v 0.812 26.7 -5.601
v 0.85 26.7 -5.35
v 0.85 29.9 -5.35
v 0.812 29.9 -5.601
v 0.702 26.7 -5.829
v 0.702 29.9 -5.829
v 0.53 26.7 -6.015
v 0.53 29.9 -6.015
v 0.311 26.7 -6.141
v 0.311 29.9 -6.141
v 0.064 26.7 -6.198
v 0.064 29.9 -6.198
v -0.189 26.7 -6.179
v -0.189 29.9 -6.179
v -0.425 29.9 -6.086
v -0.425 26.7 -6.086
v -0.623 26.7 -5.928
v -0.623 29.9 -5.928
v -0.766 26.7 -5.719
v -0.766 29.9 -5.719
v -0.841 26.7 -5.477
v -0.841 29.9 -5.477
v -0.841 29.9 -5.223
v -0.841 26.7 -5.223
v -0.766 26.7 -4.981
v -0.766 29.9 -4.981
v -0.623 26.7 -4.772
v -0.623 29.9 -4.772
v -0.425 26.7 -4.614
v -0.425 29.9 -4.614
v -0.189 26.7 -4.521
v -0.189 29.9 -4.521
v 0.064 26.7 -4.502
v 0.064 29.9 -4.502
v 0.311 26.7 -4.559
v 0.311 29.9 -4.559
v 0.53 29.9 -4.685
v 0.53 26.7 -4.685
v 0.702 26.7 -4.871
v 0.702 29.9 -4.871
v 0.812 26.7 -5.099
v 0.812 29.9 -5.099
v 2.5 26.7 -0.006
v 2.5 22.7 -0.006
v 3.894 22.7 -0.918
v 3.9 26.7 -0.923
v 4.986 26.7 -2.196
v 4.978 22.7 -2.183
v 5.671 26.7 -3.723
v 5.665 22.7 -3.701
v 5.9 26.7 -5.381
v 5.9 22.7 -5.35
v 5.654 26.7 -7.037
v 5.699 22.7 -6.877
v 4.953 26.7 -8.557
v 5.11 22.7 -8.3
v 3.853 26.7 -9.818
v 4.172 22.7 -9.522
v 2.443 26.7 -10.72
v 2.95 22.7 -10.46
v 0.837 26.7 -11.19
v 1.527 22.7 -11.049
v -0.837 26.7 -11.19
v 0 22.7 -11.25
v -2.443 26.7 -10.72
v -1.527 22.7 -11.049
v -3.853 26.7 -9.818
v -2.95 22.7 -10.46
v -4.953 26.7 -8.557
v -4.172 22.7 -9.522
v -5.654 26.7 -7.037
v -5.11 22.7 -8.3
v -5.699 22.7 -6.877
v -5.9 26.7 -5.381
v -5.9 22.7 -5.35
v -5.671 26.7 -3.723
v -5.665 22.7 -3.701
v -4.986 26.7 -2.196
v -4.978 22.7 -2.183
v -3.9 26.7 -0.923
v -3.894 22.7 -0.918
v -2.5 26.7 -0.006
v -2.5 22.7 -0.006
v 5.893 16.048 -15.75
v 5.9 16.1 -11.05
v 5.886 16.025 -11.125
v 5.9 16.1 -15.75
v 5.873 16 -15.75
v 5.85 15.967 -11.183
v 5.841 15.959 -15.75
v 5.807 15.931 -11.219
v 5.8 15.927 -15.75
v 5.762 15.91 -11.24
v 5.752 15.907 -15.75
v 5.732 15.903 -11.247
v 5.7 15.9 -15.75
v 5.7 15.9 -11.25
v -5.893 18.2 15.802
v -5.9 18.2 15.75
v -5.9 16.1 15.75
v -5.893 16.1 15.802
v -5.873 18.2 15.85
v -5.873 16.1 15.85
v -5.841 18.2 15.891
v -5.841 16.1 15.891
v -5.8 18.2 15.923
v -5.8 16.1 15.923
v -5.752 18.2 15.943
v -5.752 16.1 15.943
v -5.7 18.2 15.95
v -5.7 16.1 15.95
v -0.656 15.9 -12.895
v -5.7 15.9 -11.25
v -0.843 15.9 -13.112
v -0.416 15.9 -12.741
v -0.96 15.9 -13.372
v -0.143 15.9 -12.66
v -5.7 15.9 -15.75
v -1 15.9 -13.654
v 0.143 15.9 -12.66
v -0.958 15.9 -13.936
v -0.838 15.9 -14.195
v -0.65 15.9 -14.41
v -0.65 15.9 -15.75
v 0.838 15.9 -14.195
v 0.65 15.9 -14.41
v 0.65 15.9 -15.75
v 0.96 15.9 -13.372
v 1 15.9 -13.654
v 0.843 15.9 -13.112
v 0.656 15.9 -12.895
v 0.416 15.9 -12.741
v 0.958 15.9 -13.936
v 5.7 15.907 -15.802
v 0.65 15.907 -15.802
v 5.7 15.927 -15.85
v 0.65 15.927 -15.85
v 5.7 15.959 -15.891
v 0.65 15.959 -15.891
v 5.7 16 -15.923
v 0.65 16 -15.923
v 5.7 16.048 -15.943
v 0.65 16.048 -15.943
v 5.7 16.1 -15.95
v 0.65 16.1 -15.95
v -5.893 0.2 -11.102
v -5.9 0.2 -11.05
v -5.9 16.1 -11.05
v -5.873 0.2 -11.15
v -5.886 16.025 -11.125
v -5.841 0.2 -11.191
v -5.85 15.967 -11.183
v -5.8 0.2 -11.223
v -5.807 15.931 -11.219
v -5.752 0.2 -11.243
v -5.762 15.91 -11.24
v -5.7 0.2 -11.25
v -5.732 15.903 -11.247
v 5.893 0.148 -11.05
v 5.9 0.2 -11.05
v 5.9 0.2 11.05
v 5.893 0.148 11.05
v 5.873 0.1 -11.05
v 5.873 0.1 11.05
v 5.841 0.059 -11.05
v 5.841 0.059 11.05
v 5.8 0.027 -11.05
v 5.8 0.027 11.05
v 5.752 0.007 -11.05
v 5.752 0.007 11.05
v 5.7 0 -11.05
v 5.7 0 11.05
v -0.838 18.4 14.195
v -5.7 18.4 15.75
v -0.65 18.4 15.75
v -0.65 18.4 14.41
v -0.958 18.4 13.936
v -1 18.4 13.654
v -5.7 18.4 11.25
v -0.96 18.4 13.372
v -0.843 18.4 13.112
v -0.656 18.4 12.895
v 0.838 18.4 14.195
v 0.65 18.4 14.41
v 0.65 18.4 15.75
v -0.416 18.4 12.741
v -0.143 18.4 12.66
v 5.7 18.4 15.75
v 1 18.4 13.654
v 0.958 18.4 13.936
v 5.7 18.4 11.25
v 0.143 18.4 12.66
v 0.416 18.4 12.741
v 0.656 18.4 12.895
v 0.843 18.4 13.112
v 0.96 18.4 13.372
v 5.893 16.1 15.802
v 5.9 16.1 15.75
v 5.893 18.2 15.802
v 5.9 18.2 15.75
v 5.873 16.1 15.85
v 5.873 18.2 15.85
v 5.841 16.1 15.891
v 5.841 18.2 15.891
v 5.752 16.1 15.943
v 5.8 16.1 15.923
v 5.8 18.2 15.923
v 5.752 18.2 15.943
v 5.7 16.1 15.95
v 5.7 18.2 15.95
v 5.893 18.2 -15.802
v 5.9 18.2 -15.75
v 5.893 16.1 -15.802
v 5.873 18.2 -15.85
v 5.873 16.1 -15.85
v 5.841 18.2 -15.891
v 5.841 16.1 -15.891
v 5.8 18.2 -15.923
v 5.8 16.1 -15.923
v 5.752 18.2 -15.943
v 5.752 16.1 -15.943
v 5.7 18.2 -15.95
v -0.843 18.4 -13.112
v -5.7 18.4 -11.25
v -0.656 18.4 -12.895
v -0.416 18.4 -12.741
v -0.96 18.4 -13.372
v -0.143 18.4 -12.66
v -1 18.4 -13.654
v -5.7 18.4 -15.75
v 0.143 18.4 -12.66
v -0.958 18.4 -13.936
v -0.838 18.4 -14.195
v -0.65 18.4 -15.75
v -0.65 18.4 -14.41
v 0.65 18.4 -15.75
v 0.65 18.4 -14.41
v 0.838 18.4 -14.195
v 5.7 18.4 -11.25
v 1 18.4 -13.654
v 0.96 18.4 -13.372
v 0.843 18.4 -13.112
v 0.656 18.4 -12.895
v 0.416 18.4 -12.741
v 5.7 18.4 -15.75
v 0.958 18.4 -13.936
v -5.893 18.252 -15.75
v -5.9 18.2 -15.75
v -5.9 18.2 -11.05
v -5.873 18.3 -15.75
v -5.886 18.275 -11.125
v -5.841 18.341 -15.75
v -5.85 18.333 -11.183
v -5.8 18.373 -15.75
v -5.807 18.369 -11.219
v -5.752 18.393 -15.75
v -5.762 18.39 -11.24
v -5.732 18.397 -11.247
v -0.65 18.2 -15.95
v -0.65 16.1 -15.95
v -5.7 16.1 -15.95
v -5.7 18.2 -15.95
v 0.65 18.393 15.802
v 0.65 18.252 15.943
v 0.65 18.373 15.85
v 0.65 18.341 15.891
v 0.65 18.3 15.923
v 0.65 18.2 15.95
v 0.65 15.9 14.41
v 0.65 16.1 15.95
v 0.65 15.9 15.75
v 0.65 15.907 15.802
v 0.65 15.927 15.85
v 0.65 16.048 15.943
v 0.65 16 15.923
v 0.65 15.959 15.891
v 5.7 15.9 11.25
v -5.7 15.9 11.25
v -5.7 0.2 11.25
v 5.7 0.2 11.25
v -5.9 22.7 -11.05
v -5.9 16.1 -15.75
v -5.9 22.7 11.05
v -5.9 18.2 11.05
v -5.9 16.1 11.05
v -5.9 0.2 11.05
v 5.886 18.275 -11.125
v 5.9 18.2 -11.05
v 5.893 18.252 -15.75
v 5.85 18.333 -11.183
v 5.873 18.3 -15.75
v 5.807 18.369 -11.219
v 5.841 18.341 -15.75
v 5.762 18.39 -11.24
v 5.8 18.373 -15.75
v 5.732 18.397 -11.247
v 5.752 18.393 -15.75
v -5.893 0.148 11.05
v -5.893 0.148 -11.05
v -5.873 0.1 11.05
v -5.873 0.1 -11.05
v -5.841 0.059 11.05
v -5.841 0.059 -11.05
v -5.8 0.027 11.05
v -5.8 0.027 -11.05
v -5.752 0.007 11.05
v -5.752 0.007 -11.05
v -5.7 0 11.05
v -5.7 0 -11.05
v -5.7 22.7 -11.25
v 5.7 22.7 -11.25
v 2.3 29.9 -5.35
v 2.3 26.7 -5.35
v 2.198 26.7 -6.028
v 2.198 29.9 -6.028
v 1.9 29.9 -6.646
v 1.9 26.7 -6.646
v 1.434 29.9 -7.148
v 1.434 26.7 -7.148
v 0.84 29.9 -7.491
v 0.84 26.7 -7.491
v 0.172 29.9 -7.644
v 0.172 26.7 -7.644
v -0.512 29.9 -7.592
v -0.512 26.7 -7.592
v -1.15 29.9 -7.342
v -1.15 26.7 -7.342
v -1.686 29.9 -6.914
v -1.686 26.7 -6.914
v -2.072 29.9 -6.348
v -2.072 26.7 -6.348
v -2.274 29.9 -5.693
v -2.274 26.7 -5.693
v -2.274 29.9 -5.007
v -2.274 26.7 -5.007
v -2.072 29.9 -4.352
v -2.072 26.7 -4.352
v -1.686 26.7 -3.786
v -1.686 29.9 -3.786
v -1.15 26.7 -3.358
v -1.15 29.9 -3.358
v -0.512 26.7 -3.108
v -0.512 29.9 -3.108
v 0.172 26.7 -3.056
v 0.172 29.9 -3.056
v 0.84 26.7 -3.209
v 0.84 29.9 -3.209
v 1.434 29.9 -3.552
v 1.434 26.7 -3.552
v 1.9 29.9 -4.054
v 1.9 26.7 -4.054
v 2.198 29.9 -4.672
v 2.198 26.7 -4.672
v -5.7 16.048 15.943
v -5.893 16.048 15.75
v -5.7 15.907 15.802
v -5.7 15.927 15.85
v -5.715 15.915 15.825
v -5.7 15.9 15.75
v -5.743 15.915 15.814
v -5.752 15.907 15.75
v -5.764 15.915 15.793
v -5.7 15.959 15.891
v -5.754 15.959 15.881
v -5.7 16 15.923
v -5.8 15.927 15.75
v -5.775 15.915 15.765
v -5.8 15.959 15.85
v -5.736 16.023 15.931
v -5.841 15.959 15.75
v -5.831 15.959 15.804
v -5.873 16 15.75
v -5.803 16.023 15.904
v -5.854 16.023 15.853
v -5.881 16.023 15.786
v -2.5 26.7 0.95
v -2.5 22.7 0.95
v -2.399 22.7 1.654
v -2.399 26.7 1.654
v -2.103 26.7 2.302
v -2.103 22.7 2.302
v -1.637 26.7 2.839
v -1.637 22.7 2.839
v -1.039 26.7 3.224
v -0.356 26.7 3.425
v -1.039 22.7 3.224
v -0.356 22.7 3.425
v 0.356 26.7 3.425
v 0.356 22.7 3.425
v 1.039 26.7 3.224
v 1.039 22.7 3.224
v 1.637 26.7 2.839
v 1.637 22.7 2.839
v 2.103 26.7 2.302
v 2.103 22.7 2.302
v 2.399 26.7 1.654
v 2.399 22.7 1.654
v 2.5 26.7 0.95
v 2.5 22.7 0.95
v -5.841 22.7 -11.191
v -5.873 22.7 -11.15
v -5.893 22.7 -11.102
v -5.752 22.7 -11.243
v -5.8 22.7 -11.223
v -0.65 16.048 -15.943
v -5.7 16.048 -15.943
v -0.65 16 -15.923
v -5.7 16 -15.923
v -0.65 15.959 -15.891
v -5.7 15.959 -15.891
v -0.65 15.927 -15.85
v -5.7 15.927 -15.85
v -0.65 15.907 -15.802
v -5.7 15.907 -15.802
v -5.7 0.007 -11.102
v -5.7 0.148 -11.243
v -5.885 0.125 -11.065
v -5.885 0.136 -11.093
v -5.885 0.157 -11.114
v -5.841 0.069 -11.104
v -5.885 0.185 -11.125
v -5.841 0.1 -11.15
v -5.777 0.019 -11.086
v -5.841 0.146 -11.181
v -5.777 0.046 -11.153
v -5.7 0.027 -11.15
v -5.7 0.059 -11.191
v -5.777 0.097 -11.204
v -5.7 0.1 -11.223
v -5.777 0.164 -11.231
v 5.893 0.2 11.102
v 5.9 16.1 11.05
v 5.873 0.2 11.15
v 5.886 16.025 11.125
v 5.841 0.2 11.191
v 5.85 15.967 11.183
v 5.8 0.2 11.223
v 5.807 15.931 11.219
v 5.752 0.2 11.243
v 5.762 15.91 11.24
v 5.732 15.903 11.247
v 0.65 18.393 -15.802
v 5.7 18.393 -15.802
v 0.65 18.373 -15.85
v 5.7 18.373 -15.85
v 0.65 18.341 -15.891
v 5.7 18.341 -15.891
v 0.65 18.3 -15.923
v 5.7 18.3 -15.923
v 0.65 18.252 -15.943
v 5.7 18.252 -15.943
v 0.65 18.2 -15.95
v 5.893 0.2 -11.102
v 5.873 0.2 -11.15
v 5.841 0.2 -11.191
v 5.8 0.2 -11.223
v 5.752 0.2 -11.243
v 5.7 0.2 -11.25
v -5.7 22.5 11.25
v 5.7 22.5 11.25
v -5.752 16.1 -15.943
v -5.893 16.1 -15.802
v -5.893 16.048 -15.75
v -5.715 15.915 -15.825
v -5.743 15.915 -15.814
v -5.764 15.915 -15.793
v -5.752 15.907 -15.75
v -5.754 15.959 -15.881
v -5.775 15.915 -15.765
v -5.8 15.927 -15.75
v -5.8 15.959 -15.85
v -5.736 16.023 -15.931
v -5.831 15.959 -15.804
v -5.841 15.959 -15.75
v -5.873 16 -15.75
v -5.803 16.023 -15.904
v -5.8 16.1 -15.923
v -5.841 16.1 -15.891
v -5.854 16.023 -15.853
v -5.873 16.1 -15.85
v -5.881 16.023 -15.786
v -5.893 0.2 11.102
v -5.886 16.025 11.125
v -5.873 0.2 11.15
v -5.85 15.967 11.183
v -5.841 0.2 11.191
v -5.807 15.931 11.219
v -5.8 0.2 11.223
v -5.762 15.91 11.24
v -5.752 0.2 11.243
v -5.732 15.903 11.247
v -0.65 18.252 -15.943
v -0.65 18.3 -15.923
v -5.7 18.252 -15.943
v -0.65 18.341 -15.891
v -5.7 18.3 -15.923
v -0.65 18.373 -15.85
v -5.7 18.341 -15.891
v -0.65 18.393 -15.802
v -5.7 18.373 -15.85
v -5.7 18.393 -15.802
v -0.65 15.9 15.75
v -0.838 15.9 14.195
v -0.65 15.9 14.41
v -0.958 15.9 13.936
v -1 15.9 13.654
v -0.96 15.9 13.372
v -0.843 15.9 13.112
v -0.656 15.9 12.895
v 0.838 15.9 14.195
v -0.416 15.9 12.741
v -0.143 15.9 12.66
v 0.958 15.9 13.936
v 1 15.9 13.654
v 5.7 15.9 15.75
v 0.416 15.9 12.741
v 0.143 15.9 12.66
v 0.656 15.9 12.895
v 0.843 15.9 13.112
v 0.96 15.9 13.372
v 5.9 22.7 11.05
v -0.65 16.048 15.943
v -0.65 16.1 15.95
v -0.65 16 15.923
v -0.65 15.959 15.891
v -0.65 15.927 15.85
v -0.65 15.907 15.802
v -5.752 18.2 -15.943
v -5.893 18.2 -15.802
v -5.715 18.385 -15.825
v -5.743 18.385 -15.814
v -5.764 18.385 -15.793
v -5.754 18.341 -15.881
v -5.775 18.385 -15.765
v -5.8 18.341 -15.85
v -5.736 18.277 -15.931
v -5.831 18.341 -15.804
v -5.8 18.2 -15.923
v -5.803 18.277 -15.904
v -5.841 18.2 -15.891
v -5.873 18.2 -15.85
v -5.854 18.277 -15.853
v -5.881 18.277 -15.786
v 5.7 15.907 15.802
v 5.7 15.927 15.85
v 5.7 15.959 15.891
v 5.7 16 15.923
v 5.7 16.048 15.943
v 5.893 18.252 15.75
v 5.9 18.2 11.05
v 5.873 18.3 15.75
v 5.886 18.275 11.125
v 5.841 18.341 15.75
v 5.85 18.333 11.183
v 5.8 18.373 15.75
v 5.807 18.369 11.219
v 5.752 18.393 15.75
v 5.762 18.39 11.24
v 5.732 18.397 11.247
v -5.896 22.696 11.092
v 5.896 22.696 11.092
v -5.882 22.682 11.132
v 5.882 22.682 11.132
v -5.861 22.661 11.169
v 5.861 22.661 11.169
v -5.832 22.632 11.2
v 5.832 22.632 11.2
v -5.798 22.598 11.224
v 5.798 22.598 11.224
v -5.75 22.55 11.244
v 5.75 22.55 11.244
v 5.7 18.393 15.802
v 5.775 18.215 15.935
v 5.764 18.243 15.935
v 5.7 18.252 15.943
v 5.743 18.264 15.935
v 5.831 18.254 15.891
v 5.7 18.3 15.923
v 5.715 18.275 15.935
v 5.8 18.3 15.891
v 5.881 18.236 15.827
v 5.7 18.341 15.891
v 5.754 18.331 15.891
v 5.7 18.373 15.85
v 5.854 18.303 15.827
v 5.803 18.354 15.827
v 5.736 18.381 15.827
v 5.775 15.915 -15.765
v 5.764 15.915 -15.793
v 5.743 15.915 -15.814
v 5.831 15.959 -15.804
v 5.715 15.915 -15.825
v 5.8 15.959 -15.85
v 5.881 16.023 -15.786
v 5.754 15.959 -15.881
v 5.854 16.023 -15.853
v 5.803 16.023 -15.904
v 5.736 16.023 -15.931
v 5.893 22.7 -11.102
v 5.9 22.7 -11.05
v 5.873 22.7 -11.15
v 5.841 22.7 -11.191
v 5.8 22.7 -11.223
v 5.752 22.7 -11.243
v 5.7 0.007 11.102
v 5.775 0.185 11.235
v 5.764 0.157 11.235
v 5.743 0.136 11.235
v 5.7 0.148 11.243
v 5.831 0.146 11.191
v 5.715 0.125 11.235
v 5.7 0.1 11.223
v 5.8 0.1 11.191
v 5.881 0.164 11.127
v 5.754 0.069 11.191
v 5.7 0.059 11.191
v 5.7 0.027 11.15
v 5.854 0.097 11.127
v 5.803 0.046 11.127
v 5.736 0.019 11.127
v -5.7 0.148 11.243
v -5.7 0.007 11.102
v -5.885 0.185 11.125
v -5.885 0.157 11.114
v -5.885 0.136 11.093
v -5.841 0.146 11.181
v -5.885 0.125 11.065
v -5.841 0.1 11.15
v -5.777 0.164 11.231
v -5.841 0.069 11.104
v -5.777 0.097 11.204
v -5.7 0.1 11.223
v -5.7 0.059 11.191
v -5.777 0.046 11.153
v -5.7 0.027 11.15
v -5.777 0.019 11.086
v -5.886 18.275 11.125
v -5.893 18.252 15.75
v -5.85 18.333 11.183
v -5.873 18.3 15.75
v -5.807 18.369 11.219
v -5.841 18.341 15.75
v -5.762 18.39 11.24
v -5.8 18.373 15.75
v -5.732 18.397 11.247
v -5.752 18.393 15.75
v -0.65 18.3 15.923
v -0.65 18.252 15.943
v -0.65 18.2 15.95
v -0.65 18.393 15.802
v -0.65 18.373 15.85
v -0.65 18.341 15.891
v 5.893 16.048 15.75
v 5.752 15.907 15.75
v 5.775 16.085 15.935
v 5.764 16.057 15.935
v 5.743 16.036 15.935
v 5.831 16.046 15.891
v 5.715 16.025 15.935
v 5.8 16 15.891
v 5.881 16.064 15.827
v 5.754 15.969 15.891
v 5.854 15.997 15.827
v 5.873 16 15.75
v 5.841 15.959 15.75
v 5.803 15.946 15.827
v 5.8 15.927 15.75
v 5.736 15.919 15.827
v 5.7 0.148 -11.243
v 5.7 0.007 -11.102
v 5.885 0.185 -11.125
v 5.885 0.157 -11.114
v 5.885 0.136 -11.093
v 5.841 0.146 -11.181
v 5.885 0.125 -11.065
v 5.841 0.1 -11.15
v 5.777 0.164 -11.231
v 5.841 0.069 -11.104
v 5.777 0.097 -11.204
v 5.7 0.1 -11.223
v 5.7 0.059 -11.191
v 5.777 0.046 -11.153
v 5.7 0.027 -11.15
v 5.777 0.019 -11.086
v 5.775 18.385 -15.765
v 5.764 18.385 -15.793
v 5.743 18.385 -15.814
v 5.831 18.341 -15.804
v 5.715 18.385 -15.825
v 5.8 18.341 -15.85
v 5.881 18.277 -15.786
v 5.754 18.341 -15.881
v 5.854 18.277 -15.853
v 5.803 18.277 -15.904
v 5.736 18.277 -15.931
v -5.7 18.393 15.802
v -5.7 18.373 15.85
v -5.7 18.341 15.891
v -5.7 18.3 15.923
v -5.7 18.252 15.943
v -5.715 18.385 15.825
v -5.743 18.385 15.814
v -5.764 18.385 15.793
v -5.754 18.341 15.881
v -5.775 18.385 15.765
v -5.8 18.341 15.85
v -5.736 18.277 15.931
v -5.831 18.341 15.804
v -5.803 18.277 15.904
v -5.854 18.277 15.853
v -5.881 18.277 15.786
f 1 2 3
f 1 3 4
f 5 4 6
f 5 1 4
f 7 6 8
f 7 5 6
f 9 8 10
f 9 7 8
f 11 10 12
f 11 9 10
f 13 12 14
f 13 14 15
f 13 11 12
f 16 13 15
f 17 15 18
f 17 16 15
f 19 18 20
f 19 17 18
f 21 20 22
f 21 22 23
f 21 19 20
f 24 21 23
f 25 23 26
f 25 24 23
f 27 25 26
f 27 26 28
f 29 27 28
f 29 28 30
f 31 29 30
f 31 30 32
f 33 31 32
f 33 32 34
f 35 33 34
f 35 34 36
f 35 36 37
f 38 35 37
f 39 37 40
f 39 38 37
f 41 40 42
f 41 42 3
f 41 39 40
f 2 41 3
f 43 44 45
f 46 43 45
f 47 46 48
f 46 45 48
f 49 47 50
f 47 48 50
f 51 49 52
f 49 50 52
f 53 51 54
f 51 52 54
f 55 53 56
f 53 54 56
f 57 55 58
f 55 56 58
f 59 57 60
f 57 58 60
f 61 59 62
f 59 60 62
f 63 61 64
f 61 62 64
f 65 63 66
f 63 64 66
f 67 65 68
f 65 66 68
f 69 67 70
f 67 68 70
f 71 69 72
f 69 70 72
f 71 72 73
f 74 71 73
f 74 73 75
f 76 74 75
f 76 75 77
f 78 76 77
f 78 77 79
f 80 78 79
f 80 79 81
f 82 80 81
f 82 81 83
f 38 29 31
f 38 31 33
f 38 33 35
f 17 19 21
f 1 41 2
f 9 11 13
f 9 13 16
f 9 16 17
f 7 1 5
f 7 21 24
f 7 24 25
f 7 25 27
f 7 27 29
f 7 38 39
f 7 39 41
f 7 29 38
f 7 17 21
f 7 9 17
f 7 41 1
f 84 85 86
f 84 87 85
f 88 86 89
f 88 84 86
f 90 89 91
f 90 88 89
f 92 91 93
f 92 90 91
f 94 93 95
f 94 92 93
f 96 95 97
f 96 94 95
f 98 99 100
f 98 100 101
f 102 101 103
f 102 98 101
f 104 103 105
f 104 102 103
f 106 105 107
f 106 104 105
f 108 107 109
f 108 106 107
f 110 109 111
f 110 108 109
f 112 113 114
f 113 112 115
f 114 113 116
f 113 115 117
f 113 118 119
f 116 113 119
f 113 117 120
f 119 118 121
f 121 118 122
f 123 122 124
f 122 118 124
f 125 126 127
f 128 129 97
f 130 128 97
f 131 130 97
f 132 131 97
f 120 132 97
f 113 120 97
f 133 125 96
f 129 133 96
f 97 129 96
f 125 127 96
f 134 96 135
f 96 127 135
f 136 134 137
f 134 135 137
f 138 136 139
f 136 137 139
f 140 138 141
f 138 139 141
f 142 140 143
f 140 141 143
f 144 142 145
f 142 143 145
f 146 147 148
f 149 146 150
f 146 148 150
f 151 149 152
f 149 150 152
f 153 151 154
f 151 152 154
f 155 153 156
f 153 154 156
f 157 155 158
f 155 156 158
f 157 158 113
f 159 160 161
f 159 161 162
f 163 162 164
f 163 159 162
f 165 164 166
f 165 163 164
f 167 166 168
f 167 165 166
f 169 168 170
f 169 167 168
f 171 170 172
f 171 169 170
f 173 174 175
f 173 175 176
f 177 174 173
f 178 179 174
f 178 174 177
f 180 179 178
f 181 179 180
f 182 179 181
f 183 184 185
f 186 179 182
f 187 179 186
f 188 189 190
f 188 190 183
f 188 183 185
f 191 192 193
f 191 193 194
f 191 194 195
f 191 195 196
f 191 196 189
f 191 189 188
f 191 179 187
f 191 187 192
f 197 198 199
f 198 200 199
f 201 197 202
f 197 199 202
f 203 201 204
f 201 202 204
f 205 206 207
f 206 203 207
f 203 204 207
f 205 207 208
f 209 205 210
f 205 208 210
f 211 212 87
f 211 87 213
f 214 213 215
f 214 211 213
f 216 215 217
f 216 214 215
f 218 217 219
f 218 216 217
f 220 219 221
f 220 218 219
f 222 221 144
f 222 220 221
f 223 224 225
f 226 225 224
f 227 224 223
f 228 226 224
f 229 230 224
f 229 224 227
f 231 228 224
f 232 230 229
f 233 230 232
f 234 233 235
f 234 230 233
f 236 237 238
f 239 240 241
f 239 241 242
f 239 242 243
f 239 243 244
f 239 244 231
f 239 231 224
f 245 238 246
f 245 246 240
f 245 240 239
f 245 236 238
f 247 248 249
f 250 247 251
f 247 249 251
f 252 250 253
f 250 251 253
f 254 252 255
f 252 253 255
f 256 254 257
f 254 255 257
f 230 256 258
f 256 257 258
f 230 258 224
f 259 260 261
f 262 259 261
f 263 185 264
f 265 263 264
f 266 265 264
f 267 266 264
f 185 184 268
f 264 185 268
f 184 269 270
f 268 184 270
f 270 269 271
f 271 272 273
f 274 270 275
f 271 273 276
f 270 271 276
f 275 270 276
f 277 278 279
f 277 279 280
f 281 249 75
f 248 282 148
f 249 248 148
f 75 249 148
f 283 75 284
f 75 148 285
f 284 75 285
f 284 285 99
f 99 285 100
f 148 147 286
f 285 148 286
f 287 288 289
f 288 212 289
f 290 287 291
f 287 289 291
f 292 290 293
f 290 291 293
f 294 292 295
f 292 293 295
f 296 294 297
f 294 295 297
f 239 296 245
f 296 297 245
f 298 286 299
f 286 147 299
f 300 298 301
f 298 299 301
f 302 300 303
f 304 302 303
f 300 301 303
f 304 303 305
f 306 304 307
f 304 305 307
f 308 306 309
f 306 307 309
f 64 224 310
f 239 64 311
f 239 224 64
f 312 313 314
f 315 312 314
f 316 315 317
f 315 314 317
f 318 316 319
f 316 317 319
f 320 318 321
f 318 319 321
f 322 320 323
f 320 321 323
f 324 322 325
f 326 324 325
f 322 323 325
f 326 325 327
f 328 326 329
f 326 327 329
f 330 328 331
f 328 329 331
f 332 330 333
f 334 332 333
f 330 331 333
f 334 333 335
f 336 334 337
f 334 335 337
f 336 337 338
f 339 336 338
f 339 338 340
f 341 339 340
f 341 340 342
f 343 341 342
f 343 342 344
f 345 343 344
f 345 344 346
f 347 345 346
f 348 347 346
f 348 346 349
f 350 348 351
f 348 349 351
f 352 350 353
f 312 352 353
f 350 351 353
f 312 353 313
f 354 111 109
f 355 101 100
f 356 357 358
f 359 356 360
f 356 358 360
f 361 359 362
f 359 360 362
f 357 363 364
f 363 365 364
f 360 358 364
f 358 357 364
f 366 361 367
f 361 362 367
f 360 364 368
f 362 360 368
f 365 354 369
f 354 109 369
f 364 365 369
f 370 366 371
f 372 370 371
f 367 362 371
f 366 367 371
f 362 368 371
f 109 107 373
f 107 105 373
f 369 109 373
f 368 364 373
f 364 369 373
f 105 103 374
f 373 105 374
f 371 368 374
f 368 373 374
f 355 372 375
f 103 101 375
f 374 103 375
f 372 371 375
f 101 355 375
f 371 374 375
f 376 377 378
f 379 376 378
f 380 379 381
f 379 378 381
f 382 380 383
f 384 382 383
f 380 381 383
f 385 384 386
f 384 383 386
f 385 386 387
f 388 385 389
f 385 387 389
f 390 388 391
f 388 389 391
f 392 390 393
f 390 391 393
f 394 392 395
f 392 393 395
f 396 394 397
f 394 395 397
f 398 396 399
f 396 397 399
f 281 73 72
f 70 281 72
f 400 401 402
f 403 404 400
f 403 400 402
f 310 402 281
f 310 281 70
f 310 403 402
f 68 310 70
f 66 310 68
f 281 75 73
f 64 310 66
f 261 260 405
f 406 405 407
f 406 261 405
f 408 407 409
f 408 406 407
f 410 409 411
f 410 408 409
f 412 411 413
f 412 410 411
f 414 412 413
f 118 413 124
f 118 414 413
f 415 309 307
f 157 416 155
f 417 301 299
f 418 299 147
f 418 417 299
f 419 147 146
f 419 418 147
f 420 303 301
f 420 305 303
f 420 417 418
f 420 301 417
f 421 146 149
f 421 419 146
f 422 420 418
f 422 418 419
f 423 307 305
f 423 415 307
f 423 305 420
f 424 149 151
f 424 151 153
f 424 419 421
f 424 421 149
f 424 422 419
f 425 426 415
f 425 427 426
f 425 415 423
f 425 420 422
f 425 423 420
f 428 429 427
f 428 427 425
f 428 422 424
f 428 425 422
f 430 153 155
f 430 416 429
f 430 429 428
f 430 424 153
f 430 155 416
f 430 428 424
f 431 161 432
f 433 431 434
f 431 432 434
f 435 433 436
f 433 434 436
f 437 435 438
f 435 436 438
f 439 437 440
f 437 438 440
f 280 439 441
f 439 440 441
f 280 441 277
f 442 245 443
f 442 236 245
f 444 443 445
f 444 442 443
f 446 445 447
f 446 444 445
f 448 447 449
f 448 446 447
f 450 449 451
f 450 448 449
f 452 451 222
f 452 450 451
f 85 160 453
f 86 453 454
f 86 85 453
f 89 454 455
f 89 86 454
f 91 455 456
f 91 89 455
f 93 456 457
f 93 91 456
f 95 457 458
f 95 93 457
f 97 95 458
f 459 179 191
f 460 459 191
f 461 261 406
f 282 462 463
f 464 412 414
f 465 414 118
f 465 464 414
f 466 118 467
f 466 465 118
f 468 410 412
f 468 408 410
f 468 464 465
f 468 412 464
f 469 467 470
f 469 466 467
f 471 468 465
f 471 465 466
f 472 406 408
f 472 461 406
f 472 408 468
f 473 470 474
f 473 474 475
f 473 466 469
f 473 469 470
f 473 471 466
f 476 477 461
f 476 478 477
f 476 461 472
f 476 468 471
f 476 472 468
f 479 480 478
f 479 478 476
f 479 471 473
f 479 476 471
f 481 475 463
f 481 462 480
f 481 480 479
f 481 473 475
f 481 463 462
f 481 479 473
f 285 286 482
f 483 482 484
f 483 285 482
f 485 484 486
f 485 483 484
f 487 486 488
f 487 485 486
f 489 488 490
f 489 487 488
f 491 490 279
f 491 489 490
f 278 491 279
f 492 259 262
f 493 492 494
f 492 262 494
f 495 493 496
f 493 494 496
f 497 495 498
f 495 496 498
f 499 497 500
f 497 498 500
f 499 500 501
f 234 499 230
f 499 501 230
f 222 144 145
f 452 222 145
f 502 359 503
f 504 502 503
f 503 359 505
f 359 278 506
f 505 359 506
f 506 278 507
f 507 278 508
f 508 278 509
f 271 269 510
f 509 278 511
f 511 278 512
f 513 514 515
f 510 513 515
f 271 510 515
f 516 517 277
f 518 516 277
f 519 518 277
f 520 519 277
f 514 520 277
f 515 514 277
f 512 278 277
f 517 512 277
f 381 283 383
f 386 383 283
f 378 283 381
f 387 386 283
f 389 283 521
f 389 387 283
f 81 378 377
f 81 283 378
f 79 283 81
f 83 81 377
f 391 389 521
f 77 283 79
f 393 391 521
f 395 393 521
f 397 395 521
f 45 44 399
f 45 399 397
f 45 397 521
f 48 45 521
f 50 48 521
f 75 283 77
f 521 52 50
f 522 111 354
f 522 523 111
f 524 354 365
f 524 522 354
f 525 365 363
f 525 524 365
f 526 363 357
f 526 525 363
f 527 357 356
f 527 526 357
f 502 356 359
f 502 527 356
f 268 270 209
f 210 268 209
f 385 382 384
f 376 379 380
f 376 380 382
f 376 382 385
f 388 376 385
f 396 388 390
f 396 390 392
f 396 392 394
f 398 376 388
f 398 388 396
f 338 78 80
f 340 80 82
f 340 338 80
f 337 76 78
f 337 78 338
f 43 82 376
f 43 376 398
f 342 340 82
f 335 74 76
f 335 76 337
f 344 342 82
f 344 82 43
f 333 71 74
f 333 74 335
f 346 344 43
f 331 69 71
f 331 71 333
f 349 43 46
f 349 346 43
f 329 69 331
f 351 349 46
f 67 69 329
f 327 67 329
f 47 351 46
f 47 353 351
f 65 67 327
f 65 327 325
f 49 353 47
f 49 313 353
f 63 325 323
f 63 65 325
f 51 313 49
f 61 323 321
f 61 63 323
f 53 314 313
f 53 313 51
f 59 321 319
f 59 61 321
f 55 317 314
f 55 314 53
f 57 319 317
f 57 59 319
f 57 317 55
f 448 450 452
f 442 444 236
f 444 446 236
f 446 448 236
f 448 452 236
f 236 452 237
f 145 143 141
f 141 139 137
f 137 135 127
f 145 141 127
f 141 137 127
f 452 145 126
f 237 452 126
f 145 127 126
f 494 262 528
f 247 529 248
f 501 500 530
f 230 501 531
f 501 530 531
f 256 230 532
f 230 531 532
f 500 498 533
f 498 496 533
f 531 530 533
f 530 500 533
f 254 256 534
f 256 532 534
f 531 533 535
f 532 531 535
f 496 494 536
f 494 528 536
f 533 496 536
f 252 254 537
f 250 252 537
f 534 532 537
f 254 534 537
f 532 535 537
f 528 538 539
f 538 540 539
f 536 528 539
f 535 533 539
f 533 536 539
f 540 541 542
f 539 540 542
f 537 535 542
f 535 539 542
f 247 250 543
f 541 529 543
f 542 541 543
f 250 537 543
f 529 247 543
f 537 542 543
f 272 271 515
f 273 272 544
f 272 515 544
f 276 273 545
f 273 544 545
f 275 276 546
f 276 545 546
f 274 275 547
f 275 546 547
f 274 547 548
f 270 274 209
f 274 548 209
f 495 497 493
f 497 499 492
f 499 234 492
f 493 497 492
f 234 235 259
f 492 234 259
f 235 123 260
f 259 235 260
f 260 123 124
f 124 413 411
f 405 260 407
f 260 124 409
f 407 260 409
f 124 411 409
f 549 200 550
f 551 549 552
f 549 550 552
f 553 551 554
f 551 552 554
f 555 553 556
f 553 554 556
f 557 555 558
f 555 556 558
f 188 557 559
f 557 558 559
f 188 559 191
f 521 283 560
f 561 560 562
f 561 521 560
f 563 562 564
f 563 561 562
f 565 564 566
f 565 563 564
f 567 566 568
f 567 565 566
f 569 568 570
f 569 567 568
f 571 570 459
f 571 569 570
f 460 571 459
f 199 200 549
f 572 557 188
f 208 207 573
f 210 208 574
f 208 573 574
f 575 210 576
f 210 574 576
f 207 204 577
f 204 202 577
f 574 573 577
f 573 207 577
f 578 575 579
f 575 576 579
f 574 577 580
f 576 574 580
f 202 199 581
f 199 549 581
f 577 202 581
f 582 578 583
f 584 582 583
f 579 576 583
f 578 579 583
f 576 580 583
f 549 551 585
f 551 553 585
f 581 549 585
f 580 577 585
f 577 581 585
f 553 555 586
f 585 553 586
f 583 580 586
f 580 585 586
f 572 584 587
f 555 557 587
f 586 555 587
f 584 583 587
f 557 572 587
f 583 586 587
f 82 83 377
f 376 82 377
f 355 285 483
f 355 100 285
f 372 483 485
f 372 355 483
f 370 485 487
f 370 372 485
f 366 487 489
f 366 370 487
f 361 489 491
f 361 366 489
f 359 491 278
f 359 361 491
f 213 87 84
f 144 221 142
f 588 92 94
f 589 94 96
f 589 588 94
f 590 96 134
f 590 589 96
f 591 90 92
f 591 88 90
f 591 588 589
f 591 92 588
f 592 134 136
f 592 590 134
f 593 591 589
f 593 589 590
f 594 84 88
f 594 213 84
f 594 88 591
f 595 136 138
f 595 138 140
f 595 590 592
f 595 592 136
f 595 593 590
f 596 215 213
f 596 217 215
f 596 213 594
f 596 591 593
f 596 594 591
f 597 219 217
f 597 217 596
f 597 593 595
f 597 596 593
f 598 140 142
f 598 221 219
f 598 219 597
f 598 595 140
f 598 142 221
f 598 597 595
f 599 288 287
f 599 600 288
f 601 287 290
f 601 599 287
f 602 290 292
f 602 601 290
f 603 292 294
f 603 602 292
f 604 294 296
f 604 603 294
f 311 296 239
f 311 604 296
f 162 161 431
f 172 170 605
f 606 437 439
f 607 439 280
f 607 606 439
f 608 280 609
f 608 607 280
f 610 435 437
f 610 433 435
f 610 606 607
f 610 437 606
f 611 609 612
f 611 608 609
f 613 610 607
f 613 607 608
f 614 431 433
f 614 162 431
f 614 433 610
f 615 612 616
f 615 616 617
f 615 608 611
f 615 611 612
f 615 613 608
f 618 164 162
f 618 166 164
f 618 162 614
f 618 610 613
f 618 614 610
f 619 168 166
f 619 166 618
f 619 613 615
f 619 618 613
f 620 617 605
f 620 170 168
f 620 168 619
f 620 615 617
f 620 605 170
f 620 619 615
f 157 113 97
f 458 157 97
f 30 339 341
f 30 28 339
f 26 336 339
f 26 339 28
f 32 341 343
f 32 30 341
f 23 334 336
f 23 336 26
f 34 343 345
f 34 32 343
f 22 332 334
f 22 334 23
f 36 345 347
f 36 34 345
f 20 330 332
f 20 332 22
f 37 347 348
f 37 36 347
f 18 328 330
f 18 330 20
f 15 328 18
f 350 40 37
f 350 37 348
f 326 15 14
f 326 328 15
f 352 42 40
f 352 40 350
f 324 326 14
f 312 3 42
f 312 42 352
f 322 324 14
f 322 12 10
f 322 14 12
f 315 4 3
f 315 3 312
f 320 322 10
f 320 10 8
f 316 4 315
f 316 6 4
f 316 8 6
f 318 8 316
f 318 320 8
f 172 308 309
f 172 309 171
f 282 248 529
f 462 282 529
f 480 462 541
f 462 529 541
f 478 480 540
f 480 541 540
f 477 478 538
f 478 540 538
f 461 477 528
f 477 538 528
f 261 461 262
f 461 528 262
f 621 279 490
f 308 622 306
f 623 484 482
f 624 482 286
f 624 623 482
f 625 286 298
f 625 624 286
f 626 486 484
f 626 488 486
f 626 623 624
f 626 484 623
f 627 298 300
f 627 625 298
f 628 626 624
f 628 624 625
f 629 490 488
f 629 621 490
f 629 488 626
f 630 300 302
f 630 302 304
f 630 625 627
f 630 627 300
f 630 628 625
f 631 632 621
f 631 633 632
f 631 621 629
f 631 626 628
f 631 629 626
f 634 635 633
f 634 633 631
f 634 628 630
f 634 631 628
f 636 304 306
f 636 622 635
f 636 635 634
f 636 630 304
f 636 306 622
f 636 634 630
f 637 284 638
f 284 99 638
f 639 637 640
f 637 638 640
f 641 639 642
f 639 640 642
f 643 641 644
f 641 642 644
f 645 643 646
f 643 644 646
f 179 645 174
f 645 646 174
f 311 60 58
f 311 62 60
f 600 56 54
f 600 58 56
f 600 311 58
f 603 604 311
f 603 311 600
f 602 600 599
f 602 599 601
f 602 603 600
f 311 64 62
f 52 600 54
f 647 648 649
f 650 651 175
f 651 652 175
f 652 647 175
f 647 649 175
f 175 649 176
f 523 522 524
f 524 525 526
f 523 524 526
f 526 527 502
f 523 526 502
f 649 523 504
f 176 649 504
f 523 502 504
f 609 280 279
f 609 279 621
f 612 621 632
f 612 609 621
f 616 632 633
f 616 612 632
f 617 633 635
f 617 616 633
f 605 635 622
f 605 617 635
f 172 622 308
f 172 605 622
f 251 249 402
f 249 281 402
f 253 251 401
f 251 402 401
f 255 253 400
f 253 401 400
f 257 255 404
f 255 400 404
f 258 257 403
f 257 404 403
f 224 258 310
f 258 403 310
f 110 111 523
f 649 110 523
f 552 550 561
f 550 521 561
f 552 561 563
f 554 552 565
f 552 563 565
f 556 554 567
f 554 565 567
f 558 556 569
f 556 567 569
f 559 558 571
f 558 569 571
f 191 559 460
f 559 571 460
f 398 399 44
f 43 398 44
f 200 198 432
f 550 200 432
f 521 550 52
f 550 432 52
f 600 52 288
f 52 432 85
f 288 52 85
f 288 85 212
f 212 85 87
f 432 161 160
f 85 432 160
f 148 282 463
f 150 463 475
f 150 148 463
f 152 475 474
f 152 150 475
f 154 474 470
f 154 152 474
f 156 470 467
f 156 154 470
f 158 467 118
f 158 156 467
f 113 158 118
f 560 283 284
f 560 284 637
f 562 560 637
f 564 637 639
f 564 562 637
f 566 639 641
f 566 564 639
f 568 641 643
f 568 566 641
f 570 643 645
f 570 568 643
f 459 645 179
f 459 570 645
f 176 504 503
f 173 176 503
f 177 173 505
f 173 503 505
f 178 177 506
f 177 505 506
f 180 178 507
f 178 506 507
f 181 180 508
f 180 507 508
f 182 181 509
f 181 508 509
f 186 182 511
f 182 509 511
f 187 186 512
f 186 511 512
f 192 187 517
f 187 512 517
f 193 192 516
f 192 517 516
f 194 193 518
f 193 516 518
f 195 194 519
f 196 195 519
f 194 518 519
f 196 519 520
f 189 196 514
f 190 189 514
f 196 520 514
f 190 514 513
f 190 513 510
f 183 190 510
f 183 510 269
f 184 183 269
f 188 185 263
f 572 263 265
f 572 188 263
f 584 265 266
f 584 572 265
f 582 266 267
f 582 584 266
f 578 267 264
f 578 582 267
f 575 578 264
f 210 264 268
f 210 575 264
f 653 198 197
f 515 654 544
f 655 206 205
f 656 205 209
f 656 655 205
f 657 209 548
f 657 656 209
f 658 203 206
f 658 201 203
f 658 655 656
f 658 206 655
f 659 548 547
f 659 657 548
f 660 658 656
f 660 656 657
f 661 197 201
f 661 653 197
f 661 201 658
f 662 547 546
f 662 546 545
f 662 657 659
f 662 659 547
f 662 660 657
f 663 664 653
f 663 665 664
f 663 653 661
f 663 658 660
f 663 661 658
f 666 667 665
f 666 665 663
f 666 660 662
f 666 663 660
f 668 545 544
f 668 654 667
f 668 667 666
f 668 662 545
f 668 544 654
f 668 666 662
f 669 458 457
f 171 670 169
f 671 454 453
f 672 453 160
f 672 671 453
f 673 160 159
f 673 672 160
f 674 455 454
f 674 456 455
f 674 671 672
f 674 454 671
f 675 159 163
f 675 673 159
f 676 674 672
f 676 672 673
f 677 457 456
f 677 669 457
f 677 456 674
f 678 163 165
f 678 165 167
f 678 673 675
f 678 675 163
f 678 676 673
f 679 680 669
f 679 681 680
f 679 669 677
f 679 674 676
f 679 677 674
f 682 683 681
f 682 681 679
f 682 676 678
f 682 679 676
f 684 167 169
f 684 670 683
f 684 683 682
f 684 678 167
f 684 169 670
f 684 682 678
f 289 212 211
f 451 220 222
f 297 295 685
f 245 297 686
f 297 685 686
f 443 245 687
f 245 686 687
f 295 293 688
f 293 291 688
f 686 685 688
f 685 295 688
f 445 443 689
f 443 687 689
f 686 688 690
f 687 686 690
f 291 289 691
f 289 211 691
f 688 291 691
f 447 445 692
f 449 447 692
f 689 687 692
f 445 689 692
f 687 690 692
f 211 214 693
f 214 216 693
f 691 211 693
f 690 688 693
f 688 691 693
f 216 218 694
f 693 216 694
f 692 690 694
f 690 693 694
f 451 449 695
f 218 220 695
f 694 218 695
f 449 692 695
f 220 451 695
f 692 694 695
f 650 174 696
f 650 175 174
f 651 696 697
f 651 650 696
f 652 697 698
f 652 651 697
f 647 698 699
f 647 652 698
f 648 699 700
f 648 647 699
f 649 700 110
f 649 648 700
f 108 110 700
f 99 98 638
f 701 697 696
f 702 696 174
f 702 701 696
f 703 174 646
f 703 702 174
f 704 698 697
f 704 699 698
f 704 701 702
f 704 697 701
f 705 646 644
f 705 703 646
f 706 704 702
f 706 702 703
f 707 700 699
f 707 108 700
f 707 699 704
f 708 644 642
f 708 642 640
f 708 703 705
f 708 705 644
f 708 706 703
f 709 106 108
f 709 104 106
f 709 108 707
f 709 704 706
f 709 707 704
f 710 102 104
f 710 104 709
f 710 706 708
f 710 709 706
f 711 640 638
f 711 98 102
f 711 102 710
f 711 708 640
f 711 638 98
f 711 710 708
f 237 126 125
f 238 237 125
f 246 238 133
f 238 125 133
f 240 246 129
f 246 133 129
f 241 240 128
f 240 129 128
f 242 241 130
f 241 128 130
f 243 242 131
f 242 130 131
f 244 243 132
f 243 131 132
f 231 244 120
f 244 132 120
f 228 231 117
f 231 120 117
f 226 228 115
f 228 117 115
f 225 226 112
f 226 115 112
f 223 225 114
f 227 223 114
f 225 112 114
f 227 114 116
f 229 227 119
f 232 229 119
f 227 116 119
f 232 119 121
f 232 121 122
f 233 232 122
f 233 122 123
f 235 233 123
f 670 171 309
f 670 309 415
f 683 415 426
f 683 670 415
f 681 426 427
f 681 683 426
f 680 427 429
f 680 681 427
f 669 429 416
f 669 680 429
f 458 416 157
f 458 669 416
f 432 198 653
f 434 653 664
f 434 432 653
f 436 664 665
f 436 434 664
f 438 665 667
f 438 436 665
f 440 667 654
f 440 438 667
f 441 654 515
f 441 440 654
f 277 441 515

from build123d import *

# Parameters (mm, degrees)
ESQUISSE1_W        = 11.8
ESQUISSE1_H        = 22.5
BOSS_EXTRU_1_DEPTH = 15.9
BOSS_EXTRU_2_DEPTH = 2.5
ESQUISSE4_W        = 11.8
ESQUISSE4_H        = 22.5
BOSS_EXTRU_3_DEPTH = 4.3
BOSS_EXTRU_4_DEPTH = 4
ESQUISSE6_R        = 2.3
ESQUISSE6_R_2      = 0.85
BOSS_EXTRU_5_DEPTH = 3.2
CONG_1_R           = 0.2


with BuildPart() as part:
    # Esquisse1 → Boss.-Extru.1 (new body)
    with BuildSketch(Plane(origin=(0, 0, 0), x_dir=(1, 0, 0), z_dir=(0, 1, 0))):
        Rectangle(ESQUISSE1_W, ESQUISSE1_H)
    extrude(amount=BOSS_EXTRU_1_DEPTH)

    # Esquisse3 → Boss.-Extru.2 (add)
    with BuildSketch(Plane(origin=(0, 15.9, 0), x_dir=(1, 0, 0), z_dir=(0, 1, 0))):
        with BuildLine():
            Line((-5.9, 15.95), (-5.9, -15.95))
            Line((-5.9, -15.95), (-0.65, -15.95))
            Line((-0.65, -15.95), (-0.65, -14.409934208))
            ThreePointArc((-0.65, -14.409934208), (0, -12.65), (0.65, -14.409934208))
            Line((0.65, -14.409934208), (0.65, -15.95))
            Line((0.65, -15.95), (5.9, -15.95))
            Line((5.9, -15.95), (5.9, 15.95))
            Line((5.9, 15.95), (0.65, 15.95))
            Line((0.65, 15.95), (0.65, 14.409934208))
            ThreePointArc((0.65, 14.409934208), (0, 12.65), (-0.65, 14.409934208))
            Line((-0.65, 14.409934208), (-0.65, 15.95))
            Line((-0.65, 15.95), (-5.9, 15.95))
        make_face()
    extrude(amount=BOSS_EXTRU_2_DEPTH)

    # Esquisse4 → Boss.-Extru.3 (add)
    with BuildSketch(Plane(origin=(0, 18.4, 0), x_dir=(1, 0, 0), z_dir=(0, 1, 0))):
        Rectangle(ESQUISSE4_W, ESQUISSE4_H)
    extrude(amount=BOSS_EXTRU_3_DEPTH)

    # Esquisse5 → Boss.-Extru.4 (add)
    with BuildSketch(Plane(origin=(0, 22.7, 0), x_dir=(1, 0, 0), z_dir=(0, 1, 0))):
        with BuildLine():
            Line((2.5, -0.95), (2.5, 0.005844314))
            ThreePointArc((2.5, 0.005844314), (0, 11.25), (-2.5, 0.005844314))
            Line((-2.5, 0.005844314), (-2.5, -0.95))
            ThreePointArc((-2.5, -0.95), (0, -3.45), (2.5, -0.95))
        make_face()
    extrude(amount=BOSS_EXTRU_4_DEPTH)

    # Esquisse6 → Boss.-Extru.5 (add)
    with BuildSketch(Plane(origin=(0, 26.7, 0), x_dir=(1, 0, 0), z_dir=(0, 1, 0))):
        with Locations((0, 5.35)):
            Circle(ESQUISSE6_R)
        with Locations((0, 5.35)):
            Circle(ESQUISSE6_R_2, mode=Mode.SUBTRACT)
    extrude(amount=BOSS_EXTRU_5_DEPTH)

    # Congé1
    cong_1_edges = [part.edges().sort_by_distance(p)[0] for p in [
        (0, 0, -11.25),
        (-5.9, 17.15, -15.95),
        (5.9, 17.15, -15.95),
        (5.9, 15.9, -13.6),
        (5.9, 18.4, -13.6),
        (5.9, 20.55, -11.25),
        (-5.9, 20.55, -11.25),
        (3.275, 18.4, -15.95),
        (3.275, 15.9, -15.95),
        (-3.275, 18.4, -15.95),
        (-3.275, 15.9, -15.95),
        (-5.9, 15.9, -13.6),
        (-5.9, 18.4, -13.6),
        (5.9, 20.55, 11.25),
        (0, 22.7, 11.25),
        (-5.9, 20.55, 11.25),
        (5.9, 18.4, 13.6),
        (5.9, 15.9, 13.6),
        (5.9, 17.15, 15.95),
        (3.275, 18.4, 15.95),
        (3.275, 15.9, 15.95),
        (-5.9, 17.15, 15.95),
        (-3.275, 18.4, 15.95),
        (-3.275, 15.9, 15.95),
        (-5.9, 15.9, 13.6),
        (-5.9, 18.4, 13.6),
        (5.9, 7.95, -11.25),
        (5.9, 0, 0),
        (5.9, 7.95, 11.25),
        (0, 0, 11.25),
        (-5.9, 7.95, 11.25),
        (-5.9, 0, 0),
        (-5.9, 7.95, -11.25),
    ]]
    fillet(cong_1_edges, radius=CONG_1_R)


solid = part.part
